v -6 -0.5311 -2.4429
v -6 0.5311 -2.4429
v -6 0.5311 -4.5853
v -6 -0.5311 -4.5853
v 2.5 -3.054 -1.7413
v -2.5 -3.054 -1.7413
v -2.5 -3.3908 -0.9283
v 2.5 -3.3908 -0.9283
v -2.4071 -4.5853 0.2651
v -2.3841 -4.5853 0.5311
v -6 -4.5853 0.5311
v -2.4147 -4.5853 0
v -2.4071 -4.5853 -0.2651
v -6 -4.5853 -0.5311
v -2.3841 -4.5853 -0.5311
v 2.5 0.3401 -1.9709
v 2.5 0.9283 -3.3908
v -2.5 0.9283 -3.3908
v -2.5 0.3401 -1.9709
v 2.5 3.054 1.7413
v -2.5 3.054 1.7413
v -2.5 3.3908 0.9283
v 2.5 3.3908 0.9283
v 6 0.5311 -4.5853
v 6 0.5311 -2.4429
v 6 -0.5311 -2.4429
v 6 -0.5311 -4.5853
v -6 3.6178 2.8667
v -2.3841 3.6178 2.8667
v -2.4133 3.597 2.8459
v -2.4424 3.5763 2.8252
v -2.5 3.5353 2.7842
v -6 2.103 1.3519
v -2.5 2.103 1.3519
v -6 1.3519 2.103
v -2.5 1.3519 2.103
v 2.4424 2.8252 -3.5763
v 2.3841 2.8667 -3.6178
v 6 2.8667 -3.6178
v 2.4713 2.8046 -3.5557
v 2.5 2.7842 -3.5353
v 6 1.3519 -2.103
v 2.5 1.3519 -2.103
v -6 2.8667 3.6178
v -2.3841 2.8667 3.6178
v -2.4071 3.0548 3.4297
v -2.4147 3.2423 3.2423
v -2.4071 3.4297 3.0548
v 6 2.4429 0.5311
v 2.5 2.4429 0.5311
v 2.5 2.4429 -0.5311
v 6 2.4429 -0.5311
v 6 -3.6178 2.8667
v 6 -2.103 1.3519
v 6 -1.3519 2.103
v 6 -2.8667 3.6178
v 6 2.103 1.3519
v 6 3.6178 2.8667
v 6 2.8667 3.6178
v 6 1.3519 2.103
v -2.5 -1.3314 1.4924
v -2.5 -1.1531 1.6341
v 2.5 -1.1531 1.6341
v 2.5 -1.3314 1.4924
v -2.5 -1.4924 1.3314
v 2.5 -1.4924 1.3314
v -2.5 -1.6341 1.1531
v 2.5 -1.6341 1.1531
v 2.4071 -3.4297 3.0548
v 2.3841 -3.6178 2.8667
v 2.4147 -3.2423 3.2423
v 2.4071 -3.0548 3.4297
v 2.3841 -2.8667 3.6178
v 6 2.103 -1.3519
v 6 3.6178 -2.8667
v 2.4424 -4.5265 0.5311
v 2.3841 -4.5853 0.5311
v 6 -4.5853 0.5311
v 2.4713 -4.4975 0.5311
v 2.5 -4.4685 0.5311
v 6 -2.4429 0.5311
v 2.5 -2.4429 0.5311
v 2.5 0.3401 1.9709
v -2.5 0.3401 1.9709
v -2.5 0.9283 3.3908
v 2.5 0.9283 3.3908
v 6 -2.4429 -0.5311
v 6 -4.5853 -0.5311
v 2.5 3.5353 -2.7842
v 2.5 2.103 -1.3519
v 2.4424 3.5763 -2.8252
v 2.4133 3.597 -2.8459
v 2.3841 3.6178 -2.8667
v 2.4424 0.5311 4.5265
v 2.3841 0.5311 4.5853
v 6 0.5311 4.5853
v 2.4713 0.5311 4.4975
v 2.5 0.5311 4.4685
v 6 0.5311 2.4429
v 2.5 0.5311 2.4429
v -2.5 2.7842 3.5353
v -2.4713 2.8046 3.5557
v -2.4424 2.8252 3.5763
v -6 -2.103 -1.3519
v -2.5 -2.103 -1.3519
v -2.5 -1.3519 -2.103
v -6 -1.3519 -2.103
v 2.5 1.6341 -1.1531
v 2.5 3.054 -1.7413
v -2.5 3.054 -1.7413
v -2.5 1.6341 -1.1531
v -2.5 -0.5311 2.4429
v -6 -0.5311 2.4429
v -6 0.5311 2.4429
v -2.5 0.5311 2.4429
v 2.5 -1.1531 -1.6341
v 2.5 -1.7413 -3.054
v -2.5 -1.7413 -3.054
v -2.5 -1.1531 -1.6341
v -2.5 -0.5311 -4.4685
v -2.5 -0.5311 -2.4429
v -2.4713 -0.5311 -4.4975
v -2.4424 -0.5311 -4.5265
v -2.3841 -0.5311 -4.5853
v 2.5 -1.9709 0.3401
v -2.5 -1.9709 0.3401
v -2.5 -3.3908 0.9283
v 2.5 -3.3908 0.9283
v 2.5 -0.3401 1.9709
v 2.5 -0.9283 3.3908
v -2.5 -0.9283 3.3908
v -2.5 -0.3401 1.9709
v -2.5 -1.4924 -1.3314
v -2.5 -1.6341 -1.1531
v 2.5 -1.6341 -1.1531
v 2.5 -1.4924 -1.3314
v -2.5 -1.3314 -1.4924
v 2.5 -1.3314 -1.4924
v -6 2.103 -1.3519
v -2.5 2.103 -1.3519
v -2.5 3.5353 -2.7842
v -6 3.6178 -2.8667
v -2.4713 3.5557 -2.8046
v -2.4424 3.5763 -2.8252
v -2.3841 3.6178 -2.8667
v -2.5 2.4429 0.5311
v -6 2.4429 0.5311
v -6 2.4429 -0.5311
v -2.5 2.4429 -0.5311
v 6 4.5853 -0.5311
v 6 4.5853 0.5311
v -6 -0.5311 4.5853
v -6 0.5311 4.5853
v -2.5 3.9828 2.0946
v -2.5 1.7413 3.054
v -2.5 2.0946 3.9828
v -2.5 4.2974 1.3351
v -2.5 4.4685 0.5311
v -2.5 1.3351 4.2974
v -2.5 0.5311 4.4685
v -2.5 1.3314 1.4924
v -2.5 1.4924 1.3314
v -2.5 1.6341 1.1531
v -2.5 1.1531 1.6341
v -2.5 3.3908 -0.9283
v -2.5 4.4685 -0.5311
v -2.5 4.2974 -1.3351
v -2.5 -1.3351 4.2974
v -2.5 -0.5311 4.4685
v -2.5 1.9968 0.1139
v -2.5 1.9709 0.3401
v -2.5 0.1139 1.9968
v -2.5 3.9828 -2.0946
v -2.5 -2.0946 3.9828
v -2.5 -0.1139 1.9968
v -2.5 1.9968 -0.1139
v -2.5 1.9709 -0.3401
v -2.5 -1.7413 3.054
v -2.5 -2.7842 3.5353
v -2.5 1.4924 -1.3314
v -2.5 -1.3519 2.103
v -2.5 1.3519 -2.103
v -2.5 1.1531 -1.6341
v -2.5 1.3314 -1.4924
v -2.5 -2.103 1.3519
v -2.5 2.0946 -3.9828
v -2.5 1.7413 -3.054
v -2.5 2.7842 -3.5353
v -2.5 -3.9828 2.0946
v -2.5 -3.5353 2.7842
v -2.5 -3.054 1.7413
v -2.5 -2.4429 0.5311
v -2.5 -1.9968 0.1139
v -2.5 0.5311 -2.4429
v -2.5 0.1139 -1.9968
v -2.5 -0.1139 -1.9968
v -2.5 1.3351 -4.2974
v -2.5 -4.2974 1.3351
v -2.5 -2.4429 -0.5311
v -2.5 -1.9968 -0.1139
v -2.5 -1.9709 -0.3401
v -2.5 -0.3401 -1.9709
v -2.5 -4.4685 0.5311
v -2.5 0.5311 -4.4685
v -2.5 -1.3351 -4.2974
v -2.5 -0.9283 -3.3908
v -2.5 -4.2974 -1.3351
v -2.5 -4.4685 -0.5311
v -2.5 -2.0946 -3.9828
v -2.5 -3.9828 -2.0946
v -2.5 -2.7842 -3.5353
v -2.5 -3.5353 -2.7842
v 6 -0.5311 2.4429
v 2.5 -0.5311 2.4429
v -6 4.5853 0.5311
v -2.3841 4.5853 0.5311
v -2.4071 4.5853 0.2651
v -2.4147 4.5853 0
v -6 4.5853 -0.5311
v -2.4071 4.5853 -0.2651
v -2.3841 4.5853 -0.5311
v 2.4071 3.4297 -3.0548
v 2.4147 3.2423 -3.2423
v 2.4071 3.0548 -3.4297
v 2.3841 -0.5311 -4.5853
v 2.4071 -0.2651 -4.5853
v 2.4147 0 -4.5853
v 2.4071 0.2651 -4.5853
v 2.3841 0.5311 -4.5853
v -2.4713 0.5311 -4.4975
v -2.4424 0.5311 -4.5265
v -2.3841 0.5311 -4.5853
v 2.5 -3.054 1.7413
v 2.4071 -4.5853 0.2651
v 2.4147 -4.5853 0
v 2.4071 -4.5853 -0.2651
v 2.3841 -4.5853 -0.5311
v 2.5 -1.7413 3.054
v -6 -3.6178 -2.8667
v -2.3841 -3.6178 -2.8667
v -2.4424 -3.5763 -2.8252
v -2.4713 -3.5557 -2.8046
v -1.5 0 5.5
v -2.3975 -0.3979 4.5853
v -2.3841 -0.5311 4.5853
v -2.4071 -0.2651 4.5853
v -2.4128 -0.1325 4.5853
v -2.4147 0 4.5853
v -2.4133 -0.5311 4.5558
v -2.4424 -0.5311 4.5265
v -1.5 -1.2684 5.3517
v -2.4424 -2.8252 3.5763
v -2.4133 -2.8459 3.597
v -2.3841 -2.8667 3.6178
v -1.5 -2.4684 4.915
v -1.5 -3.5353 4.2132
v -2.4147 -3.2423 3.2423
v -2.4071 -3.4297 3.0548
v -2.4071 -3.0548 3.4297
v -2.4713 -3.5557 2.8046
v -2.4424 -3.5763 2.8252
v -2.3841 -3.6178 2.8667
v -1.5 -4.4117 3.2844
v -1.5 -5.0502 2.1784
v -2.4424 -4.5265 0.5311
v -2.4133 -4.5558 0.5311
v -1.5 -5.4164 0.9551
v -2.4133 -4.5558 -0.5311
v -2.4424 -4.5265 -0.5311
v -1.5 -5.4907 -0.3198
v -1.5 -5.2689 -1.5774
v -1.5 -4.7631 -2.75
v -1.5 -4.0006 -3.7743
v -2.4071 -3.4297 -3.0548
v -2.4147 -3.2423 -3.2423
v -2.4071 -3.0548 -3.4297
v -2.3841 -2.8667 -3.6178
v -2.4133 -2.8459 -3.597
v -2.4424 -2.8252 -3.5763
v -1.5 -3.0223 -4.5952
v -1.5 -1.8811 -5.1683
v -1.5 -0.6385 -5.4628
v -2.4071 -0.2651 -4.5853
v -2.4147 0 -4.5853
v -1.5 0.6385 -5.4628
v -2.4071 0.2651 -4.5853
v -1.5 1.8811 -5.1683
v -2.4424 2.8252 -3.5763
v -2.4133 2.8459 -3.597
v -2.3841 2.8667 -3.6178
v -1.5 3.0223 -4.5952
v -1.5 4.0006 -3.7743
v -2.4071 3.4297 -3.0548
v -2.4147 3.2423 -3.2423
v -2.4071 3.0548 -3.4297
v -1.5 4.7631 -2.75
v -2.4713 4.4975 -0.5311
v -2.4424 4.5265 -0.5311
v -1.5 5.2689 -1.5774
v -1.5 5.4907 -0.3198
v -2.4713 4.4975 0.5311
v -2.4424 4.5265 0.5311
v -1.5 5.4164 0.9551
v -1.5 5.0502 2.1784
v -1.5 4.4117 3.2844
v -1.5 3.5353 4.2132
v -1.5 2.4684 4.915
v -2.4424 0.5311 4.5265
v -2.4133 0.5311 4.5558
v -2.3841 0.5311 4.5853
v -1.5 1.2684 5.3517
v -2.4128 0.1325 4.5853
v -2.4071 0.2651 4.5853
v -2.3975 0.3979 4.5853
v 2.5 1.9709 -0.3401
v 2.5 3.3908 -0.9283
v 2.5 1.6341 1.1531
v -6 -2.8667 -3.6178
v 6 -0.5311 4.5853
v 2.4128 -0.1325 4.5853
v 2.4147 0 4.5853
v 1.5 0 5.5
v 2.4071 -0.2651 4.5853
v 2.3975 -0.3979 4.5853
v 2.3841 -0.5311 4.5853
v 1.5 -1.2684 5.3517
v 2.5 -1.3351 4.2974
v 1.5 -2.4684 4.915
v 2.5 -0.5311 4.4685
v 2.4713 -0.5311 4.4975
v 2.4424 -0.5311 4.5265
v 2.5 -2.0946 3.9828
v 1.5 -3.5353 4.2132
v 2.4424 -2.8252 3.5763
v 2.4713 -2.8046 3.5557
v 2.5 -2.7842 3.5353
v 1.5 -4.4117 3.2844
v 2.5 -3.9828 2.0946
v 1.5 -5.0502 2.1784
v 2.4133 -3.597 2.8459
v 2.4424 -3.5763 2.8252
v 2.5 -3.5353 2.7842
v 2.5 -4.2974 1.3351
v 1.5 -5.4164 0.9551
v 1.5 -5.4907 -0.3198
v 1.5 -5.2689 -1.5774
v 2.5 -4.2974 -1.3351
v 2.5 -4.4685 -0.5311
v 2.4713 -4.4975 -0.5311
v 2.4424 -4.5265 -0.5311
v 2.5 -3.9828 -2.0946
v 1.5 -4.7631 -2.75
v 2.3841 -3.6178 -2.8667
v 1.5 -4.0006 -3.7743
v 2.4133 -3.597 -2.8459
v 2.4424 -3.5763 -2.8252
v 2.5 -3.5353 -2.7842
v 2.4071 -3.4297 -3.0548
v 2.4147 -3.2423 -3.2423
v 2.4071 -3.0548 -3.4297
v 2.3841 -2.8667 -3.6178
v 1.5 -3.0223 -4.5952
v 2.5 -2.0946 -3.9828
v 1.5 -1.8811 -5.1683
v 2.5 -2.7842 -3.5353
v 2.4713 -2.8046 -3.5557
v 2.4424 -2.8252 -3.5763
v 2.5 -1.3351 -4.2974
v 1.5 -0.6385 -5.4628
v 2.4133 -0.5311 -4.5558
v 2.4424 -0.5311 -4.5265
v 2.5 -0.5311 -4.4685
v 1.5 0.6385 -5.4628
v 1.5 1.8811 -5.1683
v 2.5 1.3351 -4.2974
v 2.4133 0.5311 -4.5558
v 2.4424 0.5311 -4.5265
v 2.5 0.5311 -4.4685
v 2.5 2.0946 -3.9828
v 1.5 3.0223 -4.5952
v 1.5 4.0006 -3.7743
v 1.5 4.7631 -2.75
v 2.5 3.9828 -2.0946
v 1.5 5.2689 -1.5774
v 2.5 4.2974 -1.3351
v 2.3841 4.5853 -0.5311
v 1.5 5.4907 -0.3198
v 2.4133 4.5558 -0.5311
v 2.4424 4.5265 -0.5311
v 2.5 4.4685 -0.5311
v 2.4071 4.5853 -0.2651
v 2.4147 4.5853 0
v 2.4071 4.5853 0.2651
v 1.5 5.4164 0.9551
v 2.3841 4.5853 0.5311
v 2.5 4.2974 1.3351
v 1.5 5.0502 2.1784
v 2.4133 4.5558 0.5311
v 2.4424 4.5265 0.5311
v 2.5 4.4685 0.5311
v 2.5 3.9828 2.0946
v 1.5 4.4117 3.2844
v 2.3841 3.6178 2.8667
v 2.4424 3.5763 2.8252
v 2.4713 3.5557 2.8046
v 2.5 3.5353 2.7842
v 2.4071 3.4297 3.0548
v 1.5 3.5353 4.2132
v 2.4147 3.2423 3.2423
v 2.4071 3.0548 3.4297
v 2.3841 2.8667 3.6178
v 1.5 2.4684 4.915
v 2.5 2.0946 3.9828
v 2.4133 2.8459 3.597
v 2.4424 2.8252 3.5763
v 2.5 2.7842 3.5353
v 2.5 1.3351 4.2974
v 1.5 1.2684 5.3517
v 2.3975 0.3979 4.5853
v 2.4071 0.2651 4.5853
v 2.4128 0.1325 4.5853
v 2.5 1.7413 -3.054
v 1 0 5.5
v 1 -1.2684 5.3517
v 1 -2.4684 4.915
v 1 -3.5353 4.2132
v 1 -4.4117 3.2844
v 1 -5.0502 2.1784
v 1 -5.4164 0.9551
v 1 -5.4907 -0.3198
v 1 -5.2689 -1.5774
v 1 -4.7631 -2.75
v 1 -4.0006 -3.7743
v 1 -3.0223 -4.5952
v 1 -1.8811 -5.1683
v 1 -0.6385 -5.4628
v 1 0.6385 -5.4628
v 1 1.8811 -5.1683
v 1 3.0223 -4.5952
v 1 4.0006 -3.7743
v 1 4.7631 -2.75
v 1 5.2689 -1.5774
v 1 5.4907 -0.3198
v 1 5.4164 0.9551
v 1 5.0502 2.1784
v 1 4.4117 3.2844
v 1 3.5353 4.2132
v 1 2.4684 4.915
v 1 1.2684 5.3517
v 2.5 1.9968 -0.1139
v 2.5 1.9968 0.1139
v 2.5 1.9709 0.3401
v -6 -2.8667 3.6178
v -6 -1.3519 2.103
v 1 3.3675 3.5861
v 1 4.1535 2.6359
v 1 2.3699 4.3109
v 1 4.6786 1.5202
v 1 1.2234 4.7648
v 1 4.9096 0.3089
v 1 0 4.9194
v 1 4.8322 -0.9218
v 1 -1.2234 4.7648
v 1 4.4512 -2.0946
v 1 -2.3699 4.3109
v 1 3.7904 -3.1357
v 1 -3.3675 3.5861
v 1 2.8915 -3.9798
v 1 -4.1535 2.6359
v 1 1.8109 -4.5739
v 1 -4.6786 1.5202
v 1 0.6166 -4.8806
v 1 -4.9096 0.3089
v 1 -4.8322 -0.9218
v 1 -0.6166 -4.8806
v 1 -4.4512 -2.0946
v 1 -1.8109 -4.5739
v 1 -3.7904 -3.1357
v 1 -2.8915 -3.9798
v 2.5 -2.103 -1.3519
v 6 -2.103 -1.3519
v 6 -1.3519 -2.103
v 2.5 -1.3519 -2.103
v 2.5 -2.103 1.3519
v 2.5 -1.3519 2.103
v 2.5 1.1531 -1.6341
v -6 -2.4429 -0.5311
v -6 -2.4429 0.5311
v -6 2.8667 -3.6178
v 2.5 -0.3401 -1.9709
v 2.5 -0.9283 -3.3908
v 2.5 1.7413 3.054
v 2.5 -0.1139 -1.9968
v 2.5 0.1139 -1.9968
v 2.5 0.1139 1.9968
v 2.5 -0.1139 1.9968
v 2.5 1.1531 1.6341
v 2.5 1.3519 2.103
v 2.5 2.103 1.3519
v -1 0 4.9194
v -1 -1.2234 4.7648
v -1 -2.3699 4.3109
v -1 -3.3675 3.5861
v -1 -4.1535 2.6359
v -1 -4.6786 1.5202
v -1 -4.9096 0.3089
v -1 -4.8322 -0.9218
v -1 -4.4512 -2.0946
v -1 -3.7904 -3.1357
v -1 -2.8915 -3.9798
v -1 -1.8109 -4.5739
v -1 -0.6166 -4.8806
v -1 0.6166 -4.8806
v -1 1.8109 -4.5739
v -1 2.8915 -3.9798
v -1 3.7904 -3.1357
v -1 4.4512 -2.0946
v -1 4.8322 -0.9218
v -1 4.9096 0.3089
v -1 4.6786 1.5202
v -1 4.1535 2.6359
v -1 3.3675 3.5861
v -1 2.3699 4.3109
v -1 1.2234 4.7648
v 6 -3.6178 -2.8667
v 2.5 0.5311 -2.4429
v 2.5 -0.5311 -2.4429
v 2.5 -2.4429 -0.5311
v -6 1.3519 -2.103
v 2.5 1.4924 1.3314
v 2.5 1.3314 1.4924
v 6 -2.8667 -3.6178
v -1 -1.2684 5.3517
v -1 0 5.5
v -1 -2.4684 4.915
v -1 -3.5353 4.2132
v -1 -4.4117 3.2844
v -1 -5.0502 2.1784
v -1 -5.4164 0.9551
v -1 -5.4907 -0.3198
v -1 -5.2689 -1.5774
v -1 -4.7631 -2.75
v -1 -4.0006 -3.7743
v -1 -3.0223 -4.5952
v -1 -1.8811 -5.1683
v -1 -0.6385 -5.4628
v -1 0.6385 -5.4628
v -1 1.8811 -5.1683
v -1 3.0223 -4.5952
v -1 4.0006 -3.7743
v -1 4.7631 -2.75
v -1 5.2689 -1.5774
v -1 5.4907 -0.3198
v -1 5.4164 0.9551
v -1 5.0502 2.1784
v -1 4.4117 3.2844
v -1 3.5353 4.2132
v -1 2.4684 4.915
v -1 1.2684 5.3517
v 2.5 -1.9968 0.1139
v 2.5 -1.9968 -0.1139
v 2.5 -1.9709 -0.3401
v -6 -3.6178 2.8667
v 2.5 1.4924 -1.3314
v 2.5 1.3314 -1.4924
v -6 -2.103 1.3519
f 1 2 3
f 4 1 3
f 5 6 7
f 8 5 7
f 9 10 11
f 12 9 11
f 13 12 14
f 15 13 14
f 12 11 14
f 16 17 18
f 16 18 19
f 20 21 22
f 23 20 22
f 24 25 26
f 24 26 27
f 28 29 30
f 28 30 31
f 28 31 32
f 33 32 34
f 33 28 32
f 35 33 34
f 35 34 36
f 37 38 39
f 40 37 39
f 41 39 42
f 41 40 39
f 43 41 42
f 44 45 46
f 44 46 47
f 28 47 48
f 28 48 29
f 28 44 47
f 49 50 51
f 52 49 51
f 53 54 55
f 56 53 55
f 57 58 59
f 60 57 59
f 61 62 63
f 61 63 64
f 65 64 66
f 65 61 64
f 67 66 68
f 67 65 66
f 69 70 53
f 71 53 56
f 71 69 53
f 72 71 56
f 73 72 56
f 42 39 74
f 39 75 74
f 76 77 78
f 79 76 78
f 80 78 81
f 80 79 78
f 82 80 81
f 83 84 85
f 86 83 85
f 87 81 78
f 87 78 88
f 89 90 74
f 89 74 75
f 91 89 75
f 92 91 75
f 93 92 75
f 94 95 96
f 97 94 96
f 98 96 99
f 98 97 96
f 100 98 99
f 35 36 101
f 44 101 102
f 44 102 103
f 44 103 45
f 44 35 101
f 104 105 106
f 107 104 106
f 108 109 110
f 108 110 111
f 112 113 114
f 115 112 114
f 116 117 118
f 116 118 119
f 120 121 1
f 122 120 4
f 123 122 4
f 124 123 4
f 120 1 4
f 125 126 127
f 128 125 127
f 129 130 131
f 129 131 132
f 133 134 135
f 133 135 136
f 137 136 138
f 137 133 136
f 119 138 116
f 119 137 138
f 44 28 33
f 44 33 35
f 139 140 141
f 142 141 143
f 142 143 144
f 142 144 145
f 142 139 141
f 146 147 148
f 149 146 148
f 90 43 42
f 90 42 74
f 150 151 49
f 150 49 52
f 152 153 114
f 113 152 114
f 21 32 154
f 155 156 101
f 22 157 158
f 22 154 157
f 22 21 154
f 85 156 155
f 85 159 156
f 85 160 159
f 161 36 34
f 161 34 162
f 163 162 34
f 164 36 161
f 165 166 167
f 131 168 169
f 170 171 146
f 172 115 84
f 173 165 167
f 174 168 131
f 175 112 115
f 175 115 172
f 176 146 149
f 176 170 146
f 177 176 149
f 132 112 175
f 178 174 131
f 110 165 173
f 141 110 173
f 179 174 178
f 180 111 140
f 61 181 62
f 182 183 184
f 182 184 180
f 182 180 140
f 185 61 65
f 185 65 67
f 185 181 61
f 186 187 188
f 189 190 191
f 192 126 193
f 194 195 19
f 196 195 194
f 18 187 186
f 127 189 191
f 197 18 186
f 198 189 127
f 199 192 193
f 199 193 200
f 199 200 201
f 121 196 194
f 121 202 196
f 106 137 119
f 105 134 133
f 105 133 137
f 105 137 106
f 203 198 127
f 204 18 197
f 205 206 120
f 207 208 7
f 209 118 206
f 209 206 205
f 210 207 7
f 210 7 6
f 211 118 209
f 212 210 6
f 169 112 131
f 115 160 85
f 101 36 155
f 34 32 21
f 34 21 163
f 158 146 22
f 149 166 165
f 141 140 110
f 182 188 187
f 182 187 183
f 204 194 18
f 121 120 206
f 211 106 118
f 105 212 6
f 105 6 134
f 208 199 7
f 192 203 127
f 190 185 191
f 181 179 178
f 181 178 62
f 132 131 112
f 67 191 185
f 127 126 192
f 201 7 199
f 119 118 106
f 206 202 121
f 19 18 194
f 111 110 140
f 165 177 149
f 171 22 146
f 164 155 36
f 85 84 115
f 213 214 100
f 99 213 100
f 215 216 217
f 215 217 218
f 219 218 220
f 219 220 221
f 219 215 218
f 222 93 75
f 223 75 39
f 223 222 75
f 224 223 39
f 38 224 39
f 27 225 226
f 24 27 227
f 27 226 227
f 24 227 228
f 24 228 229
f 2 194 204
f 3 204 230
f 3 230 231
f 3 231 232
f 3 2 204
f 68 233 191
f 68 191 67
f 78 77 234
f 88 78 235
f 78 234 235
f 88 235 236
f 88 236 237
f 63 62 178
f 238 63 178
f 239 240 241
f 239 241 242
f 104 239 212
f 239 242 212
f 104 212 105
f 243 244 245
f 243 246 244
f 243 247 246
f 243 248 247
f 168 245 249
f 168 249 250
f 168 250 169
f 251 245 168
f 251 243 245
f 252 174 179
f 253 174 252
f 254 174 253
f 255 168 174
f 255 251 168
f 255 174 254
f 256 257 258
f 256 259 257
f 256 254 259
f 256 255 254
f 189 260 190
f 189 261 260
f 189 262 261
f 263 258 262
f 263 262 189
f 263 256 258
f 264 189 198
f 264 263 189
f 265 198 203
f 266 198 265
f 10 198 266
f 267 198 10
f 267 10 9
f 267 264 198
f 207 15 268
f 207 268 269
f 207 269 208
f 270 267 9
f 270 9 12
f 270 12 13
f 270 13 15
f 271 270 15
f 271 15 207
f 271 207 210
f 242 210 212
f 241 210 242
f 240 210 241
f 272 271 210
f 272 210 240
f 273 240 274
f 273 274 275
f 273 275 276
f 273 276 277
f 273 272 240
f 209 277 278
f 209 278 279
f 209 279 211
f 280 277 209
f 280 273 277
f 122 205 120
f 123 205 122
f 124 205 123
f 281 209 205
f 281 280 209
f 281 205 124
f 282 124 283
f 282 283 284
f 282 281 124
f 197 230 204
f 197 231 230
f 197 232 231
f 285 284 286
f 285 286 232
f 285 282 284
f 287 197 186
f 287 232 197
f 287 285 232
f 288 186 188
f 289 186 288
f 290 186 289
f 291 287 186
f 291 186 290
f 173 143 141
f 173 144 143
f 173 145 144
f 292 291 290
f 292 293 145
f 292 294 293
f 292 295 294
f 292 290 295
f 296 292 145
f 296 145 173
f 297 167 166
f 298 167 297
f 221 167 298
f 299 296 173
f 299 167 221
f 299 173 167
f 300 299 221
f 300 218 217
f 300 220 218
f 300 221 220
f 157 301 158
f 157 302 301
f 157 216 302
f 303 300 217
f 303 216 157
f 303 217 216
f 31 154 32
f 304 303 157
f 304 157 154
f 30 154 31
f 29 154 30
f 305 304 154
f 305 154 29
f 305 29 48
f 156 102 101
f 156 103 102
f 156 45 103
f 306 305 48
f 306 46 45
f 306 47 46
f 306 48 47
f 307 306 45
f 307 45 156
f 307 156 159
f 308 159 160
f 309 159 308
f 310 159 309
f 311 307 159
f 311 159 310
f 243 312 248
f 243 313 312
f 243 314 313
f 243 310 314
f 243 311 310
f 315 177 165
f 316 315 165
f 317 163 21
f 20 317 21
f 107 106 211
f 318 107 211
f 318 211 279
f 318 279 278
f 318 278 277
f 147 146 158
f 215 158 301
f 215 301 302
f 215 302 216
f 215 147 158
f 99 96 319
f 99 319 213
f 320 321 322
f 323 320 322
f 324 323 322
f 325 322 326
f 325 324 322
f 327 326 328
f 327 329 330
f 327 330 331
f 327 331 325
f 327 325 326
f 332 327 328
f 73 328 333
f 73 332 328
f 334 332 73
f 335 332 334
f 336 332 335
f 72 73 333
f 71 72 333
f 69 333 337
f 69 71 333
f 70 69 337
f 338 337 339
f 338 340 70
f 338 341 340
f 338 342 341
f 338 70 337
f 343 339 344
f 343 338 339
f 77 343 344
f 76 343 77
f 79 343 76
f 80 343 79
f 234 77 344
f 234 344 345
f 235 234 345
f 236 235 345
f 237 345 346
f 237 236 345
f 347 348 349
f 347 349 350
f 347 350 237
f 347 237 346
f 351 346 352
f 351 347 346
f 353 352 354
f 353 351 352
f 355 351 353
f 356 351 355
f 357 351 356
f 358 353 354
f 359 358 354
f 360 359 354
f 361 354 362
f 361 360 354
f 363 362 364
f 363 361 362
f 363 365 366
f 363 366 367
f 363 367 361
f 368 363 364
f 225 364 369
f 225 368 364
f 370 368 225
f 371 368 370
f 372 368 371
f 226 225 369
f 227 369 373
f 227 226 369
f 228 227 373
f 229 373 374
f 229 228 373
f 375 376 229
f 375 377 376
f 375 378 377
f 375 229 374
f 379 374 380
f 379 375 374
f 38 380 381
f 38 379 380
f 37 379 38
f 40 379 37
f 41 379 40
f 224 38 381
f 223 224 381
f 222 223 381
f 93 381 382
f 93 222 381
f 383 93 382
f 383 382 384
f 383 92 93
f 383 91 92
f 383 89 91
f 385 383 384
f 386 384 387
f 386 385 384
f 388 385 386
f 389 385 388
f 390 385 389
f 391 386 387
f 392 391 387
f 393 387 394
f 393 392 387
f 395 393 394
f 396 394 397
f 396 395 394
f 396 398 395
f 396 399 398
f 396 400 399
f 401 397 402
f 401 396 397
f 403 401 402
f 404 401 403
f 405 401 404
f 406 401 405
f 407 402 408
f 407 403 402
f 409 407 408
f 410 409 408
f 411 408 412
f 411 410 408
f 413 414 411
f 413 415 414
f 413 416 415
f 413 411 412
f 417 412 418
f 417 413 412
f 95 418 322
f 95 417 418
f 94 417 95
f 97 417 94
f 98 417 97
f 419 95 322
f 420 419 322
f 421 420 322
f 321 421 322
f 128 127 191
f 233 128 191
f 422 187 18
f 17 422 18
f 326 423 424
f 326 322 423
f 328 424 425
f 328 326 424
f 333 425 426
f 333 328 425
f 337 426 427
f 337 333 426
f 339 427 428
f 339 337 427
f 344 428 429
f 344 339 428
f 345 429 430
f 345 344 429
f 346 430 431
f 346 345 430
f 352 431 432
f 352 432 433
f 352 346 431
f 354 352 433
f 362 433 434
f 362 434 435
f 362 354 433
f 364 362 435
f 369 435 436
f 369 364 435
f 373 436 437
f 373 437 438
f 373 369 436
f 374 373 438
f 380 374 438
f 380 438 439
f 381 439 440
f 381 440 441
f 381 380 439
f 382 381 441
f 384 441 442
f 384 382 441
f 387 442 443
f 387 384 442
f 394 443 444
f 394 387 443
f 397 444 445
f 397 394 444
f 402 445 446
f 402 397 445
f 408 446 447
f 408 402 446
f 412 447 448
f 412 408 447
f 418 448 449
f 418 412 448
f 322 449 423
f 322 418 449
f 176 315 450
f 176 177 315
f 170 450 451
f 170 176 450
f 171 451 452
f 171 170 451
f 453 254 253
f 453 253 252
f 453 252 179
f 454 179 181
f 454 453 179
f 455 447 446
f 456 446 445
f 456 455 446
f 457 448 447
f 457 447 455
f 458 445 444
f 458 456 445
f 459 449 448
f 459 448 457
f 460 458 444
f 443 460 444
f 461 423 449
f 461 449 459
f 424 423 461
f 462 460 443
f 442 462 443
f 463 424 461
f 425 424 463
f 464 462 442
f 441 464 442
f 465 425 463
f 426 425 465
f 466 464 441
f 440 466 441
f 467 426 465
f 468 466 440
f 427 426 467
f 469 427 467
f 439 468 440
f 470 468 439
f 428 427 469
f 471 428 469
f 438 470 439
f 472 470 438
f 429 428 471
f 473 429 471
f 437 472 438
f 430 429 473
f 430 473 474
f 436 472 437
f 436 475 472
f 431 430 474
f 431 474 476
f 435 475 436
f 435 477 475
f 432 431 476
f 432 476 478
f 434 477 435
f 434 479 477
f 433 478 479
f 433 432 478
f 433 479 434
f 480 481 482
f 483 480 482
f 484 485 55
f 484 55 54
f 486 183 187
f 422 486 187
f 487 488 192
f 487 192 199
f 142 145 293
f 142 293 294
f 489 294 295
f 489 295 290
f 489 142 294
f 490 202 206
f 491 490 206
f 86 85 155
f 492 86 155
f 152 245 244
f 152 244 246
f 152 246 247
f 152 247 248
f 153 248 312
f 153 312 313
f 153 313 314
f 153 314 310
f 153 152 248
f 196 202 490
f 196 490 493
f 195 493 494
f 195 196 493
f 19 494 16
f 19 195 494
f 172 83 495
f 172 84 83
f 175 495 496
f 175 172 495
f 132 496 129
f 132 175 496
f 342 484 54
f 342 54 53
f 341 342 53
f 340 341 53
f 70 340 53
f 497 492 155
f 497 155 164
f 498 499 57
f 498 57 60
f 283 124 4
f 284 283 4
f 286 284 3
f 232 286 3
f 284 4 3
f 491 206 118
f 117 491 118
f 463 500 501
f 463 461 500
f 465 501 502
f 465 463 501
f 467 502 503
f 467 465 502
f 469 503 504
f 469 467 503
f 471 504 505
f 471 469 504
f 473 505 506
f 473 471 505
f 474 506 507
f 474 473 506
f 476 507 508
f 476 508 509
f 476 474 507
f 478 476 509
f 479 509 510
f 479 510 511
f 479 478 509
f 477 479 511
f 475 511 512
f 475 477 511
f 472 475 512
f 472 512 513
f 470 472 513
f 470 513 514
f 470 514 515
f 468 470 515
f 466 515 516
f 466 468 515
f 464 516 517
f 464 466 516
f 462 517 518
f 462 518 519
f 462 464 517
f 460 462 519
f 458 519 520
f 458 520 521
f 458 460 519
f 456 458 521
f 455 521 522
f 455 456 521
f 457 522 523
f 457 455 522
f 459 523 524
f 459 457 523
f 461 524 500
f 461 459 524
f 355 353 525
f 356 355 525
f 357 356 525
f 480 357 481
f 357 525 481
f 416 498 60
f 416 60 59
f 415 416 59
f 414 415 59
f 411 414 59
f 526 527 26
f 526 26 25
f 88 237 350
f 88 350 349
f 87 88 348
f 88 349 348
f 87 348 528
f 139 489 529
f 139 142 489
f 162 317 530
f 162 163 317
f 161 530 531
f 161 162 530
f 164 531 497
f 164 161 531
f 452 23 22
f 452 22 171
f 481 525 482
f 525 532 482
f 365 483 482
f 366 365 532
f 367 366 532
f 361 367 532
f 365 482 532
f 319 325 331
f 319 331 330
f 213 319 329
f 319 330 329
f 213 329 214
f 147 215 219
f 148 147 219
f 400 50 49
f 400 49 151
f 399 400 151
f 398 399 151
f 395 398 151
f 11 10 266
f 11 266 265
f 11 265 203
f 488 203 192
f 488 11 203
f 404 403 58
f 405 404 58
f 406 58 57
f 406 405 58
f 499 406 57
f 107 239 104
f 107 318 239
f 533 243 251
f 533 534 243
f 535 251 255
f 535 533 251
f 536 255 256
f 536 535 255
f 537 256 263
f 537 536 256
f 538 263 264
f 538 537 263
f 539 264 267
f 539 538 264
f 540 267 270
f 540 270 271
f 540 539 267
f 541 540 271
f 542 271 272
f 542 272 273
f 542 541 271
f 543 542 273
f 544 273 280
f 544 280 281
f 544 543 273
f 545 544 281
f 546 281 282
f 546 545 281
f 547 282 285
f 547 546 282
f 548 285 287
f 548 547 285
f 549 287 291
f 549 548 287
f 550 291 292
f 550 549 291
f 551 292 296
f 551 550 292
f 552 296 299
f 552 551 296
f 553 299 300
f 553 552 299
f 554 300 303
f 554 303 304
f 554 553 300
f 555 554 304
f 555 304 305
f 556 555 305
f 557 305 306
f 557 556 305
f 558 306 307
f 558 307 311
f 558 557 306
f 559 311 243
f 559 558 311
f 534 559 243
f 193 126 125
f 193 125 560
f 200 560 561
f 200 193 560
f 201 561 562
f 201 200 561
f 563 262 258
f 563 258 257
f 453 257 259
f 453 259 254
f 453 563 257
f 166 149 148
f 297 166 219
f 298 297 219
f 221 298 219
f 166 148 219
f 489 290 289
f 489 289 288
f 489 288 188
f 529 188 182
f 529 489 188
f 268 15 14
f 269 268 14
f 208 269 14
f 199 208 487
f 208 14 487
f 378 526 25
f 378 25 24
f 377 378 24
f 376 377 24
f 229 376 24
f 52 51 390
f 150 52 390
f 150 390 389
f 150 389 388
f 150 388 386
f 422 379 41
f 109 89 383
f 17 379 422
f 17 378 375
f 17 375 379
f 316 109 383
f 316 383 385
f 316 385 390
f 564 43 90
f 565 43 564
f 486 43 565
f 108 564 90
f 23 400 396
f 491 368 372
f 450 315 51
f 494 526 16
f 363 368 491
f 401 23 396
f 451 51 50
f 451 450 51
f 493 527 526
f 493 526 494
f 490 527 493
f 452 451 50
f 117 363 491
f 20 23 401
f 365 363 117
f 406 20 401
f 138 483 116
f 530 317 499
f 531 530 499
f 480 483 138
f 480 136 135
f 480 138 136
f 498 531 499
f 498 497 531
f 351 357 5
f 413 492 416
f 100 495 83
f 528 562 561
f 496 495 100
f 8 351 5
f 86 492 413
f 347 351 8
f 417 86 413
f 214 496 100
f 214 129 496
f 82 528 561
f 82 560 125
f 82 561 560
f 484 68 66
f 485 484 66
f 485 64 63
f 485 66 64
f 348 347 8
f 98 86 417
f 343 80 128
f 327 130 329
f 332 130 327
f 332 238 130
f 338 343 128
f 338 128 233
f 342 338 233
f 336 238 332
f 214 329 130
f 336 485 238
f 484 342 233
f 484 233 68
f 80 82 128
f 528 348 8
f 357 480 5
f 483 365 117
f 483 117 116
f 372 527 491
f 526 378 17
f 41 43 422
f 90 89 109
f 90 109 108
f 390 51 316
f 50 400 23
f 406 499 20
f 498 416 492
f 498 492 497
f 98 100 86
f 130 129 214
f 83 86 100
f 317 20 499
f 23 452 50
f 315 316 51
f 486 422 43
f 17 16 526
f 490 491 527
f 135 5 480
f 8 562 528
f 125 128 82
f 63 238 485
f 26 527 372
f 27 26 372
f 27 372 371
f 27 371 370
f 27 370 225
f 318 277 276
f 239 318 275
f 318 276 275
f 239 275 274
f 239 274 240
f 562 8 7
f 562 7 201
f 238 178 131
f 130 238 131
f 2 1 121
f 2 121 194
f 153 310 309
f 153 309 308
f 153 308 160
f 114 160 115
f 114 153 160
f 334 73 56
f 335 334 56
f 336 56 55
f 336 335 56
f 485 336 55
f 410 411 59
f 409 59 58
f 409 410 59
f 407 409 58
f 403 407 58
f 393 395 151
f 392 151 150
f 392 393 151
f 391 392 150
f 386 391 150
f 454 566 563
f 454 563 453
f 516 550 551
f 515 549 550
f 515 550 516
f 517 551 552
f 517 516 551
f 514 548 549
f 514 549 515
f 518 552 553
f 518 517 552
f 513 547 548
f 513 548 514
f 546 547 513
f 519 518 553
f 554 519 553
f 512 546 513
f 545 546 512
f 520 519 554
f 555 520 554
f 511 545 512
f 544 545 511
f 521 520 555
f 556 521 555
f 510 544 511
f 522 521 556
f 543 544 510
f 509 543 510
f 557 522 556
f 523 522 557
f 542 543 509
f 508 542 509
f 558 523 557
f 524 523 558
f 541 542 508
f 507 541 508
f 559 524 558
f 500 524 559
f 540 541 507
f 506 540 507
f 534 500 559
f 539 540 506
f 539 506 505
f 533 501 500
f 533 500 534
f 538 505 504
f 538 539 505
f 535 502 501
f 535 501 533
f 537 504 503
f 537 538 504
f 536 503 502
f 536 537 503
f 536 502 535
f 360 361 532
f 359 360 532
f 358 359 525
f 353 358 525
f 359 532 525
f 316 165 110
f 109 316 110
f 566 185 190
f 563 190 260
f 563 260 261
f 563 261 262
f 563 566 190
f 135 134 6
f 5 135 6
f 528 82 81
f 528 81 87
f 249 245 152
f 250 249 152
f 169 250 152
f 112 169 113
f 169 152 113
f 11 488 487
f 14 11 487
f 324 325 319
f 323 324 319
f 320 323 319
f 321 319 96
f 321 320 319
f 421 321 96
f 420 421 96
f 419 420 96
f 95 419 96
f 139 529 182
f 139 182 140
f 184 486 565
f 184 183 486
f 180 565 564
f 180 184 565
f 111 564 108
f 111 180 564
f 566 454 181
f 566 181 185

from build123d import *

# Parameters (mm, degrees)
SKETCH1_W               = 1.062231574
SKETCH1_H               = 2.14234413
SKETCH1_W_2             = 2.14234413
SKETCH1_H_2             = 1.062231574
BOSS_EXTRUDE3_DEPTH     = 6
CUT_EXTRUDE1_DEPTH      = 10.823441352
CUT_EXTRUDE1_DEPTH_BACK = 10.823441352


with BuildPart() as part:
    # Sketch3 → Revolve1 (revolve)
    with BuildSketch(Plane(origin=(0, 0, 0), x_dir=(1, 0, 0), z_dir=(0, 1, 0)), mode=Mode.PRIVATE) as revolve1_sk:
        Polygon((1, 5.5), (1.5, 5.5), (2.5, 4.5), (2.5, 2), (-2.5, 2), (-2.5, 4.5), (-1.5, 5.5), (-1, 5.5), (-1, 4.919351403), (1, 4.919351403), align=None)
    revolve(revolve1_sk.sketch.rotate(Axis((0, 0, 0), (1, 0, 0)), 180), axis=Axis((0, 0, 0), (1, 0, 0)))

    # Sketch1 → Boss-Extrude3 (add, symmetric)
    with BuildSketch(Plane(origin=(0, 0, 0), x_dir=(0, 0, -1), z_dir=(1, 0, 0))):
        Polygon((-3.617835313, -2.866724163), (-2.102969252, -1.351858102), (-1.351858102, -2.102969252), (-2.866724163, -3.617835313), align=None)
        with Locations((0, -3.514103914)):
            Rectangle(SKETCH1_W, SKETCH1_H)
        with Locations((-3.514103914, 0)):
            Rectangle(SKETCH1_W_2, SKETCH1_H_2)
        Polygon((-2.866724163, 3.617835313), (-1.351858102, 2.102969252), (-2.102969252, 1.351858102), (-3.617835313, 2.866724163), align=None)
        with Locations((0, 3.514103914)):
            Rectangle(SKETCH1_W, SKETCH1_H)
        Polygon((3.617835313, 2.866724163), (2.102969252, 1.351858102), (1.351858102, 2.102969252), (2.866724163, 3.617835313), align=None)
        with Locations((3.514103914, 0)):
            Rectangle(SKETCH1_W_2, SKETCH1_H_2)
        Polygon((2.866724163, -3.617835313), (1.351858102, -2.102969252), (2.102969252, -1.351858102), (3.617835313, -2.866724163), align=None)
    extrude(amount=BOSS_EXTRUDE3_DEPTH, both=True)

    # Sketch4 → Cut-Extrude1 (cut, two sides: drawn at the far end of the back side and taken through both)
    with BuildSketch(Plane(origin=(0, 0, 0), x_dir=(0, 0, -1), z_dir=(1, 0, 0)).offset(-CUT_EXTRUDE1_DEPTH_BACK)):
        Polygon((1.741274388, 3.054032834), (1.128980896, 1.575825582), (0.315966908, 1.912587003), (0.928260399, 3.390794255), align=None)
        Polygon((3.390794255, 0.928260399), (1.912587003, 0.315966908), (1.575825582, 1.128980896), (3.054032834, 1.741274388), align=None)
        Polygon((3.054032834, -1.741274388), (1.575825582, -1.128980896), (1.912587003, -0.315966908), (3.390794255, -0.928260399), align=None)
        Polygon((0.928260399, -3.390794255), (0.315966908, -1.912587003), (1.128980896, -1.575825582), (1.741274388, -3.054032834), align=None)
        Polygon((-1.741274388, -3.054032834), (-1.128980896, -1.575825582), (-0.315966908, -1.912587003), (-0.928260399, -3.390794255), align=None)
        Polygon((-3.390794255, -0.928260399), (-1.912587003, -0.315966908), (-1.575825582, -1.128980896), (-3.054032834, -1.741274388), align=None)
        Polygon((-3.054032834, 1.741274388), (-1.575825582, 1.128980896), (-1.912587003, 0.315966908), (-3.390794255, 0.928260399), align=None)
        Polygon((-0.928260399, 3.390794255), (-0.315966908, 1.912587003), (-1.128980896, 1.575825582), (-1.741274388, 3.054032834), align=None)
    extrude(amount=CUT_EXTRUDE1_DEPTH + CUT_EXTRUDE1_DEPTH_BACK, mode=Mode.SUBTRACT)


solid = part.part
